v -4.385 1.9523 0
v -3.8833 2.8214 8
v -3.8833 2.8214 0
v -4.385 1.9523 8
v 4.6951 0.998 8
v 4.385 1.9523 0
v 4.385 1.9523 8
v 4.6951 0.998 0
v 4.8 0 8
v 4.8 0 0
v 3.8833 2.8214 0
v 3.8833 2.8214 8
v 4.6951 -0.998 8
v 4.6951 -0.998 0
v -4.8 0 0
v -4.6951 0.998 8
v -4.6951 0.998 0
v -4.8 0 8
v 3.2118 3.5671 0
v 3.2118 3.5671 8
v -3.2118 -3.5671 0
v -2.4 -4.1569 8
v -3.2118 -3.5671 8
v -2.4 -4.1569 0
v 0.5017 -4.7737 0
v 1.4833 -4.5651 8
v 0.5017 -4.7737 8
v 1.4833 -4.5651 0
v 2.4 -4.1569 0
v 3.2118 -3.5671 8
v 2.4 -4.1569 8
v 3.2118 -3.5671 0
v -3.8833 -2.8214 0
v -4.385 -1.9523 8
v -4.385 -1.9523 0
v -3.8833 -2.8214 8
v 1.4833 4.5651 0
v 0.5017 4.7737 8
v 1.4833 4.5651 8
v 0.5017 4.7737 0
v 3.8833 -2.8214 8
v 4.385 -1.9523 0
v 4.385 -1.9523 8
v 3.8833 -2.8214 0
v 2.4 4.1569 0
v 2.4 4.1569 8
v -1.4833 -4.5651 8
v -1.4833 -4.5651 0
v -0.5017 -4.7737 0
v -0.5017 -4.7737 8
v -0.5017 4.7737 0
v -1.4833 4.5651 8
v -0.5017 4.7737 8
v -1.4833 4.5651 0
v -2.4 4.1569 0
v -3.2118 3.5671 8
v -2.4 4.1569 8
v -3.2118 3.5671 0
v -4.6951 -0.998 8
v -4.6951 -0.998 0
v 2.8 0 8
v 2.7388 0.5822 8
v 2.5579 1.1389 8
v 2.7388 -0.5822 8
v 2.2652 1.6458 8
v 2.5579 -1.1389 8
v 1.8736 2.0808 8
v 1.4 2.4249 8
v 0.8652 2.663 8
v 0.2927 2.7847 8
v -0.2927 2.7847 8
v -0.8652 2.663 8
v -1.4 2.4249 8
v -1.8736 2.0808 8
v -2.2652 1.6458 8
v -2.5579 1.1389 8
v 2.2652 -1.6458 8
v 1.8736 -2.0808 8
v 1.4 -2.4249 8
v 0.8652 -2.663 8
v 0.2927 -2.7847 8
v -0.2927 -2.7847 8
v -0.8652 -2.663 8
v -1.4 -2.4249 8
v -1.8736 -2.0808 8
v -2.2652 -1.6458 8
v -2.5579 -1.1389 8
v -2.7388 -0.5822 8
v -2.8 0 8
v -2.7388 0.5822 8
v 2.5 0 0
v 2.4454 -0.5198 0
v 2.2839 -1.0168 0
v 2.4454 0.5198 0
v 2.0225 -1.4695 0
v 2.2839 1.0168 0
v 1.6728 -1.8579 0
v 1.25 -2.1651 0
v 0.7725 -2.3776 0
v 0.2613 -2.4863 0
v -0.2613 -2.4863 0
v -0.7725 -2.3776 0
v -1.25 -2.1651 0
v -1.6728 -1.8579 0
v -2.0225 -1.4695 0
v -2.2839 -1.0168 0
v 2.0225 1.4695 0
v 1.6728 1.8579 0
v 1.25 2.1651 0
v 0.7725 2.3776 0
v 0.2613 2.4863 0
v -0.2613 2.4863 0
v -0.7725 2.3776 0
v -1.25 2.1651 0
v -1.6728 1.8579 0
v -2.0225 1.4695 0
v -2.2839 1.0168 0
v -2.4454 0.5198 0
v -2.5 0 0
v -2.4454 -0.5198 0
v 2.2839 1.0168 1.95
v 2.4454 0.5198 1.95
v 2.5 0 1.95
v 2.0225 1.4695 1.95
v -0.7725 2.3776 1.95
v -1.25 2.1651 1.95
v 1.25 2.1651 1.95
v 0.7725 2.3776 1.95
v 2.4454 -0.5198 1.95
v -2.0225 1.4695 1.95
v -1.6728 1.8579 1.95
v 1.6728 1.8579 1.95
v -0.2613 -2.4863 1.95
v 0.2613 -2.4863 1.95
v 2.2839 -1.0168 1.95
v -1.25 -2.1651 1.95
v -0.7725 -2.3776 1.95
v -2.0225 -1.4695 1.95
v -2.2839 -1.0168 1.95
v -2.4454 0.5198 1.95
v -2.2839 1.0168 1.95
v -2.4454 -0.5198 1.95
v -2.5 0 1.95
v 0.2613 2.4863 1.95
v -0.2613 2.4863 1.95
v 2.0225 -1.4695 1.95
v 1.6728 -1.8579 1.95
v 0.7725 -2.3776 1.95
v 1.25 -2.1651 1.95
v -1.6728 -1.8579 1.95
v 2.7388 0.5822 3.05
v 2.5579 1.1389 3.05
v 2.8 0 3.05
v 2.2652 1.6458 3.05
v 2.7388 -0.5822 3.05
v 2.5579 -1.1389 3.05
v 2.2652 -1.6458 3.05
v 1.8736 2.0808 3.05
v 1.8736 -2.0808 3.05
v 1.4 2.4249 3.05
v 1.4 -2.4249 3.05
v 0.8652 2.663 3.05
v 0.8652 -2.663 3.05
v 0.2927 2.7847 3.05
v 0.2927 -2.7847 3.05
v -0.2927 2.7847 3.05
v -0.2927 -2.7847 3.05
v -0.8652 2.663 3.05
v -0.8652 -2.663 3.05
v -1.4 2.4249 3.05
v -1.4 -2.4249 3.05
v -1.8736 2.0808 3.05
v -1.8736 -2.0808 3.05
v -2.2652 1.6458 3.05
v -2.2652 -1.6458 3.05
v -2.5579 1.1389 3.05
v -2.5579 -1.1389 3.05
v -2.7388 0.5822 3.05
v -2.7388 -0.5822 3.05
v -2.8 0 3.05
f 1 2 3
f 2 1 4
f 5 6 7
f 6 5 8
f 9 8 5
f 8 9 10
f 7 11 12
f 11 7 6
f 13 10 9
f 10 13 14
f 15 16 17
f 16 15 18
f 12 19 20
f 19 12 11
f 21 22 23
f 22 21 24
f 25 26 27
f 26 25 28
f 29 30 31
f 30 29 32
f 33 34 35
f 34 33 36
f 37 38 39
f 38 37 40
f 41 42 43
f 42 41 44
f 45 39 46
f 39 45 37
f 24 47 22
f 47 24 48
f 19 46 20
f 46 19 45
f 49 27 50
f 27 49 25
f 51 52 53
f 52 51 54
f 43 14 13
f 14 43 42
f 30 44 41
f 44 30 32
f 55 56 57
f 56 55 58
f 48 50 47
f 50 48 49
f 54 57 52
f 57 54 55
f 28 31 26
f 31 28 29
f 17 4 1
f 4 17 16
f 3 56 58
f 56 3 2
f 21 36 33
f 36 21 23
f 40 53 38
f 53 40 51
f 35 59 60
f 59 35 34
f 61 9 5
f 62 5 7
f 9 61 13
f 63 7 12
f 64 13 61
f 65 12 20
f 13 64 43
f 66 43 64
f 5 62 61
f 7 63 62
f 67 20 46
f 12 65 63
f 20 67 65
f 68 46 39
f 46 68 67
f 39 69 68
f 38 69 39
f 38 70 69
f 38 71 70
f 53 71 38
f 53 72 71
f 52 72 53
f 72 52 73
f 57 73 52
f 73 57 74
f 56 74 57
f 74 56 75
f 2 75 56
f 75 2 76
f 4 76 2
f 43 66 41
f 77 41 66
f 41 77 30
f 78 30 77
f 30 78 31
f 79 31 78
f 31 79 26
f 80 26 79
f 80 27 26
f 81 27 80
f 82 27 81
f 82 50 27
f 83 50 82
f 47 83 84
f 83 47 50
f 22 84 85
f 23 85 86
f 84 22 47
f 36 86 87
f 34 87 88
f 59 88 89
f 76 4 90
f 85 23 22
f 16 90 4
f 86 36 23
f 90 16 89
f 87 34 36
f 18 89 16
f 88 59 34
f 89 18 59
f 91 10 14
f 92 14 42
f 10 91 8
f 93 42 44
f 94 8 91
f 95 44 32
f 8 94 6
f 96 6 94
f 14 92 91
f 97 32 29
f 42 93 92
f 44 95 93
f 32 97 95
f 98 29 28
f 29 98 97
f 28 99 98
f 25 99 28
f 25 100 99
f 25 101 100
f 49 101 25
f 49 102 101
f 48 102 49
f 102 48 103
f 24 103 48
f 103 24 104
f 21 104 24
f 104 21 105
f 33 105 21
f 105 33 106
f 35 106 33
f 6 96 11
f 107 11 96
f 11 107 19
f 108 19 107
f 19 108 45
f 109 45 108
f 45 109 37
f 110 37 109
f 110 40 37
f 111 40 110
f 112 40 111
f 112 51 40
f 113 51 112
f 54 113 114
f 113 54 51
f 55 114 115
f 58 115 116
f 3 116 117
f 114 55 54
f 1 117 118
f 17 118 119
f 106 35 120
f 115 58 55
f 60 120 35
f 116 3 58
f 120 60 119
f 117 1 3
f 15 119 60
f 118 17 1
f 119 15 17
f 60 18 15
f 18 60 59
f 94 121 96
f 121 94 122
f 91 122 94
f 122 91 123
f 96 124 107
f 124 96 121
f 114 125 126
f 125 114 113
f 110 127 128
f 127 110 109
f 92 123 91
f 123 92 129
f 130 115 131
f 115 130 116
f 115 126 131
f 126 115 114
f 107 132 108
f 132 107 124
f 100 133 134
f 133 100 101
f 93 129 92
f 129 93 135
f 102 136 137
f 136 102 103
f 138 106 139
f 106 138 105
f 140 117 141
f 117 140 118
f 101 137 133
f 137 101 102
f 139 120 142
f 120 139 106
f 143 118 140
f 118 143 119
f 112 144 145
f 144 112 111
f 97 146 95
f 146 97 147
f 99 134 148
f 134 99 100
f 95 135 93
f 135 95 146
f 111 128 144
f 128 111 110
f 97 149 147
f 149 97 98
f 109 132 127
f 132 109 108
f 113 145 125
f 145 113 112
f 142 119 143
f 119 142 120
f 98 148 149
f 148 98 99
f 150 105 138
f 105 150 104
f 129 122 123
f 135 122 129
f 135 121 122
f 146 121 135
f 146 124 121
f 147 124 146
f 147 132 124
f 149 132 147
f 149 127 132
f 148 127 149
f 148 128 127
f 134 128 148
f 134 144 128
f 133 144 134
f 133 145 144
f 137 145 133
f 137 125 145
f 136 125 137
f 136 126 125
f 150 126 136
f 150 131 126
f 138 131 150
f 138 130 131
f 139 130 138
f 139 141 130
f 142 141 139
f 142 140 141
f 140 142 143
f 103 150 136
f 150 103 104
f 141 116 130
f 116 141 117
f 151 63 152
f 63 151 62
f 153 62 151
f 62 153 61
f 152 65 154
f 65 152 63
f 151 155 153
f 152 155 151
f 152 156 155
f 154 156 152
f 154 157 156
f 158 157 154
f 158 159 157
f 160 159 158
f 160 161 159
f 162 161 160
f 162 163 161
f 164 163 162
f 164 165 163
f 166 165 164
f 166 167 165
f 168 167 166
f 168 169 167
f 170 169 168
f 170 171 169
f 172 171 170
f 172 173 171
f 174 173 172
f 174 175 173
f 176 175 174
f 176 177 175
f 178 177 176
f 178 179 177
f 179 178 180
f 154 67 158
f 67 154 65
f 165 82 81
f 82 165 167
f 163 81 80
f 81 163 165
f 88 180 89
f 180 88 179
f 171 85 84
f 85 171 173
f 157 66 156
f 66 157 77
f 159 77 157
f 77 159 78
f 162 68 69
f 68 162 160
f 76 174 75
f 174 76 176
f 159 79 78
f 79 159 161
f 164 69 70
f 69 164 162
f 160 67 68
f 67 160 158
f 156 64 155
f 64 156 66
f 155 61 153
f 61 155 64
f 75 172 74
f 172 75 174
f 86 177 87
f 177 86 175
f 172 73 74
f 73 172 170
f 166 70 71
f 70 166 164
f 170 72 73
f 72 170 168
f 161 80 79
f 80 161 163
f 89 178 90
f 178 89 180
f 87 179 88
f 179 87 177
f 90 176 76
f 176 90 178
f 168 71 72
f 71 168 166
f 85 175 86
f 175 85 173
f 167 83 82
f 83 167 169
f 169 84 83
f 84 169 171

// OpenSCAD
// magnet 5x2 holder on 6mm axis with thread

$fn=30;
ov = 0.05; // overshot for crear view

r_mag    = 2.5;
h_mag    = 2.0;
r_axis   = 2.8; // 5.6 = 6.0 - thread
h_axis   = 5.0;
h_mid    = 1.0;
r_out = max(r_mag,r_axis) + 2.0;
h_all = h_mag + h_mid + h_axis;

difference() {
  union() {
    cylinder( h=h_all, r=r_out );
  }
  translate([0,0,-ov]) cylinder( h=h_mag, r=r_mag );
  translate([0,0,h_mag+h_mid+ov]) cylinder( h=h_axis, r=r_axis );
}
